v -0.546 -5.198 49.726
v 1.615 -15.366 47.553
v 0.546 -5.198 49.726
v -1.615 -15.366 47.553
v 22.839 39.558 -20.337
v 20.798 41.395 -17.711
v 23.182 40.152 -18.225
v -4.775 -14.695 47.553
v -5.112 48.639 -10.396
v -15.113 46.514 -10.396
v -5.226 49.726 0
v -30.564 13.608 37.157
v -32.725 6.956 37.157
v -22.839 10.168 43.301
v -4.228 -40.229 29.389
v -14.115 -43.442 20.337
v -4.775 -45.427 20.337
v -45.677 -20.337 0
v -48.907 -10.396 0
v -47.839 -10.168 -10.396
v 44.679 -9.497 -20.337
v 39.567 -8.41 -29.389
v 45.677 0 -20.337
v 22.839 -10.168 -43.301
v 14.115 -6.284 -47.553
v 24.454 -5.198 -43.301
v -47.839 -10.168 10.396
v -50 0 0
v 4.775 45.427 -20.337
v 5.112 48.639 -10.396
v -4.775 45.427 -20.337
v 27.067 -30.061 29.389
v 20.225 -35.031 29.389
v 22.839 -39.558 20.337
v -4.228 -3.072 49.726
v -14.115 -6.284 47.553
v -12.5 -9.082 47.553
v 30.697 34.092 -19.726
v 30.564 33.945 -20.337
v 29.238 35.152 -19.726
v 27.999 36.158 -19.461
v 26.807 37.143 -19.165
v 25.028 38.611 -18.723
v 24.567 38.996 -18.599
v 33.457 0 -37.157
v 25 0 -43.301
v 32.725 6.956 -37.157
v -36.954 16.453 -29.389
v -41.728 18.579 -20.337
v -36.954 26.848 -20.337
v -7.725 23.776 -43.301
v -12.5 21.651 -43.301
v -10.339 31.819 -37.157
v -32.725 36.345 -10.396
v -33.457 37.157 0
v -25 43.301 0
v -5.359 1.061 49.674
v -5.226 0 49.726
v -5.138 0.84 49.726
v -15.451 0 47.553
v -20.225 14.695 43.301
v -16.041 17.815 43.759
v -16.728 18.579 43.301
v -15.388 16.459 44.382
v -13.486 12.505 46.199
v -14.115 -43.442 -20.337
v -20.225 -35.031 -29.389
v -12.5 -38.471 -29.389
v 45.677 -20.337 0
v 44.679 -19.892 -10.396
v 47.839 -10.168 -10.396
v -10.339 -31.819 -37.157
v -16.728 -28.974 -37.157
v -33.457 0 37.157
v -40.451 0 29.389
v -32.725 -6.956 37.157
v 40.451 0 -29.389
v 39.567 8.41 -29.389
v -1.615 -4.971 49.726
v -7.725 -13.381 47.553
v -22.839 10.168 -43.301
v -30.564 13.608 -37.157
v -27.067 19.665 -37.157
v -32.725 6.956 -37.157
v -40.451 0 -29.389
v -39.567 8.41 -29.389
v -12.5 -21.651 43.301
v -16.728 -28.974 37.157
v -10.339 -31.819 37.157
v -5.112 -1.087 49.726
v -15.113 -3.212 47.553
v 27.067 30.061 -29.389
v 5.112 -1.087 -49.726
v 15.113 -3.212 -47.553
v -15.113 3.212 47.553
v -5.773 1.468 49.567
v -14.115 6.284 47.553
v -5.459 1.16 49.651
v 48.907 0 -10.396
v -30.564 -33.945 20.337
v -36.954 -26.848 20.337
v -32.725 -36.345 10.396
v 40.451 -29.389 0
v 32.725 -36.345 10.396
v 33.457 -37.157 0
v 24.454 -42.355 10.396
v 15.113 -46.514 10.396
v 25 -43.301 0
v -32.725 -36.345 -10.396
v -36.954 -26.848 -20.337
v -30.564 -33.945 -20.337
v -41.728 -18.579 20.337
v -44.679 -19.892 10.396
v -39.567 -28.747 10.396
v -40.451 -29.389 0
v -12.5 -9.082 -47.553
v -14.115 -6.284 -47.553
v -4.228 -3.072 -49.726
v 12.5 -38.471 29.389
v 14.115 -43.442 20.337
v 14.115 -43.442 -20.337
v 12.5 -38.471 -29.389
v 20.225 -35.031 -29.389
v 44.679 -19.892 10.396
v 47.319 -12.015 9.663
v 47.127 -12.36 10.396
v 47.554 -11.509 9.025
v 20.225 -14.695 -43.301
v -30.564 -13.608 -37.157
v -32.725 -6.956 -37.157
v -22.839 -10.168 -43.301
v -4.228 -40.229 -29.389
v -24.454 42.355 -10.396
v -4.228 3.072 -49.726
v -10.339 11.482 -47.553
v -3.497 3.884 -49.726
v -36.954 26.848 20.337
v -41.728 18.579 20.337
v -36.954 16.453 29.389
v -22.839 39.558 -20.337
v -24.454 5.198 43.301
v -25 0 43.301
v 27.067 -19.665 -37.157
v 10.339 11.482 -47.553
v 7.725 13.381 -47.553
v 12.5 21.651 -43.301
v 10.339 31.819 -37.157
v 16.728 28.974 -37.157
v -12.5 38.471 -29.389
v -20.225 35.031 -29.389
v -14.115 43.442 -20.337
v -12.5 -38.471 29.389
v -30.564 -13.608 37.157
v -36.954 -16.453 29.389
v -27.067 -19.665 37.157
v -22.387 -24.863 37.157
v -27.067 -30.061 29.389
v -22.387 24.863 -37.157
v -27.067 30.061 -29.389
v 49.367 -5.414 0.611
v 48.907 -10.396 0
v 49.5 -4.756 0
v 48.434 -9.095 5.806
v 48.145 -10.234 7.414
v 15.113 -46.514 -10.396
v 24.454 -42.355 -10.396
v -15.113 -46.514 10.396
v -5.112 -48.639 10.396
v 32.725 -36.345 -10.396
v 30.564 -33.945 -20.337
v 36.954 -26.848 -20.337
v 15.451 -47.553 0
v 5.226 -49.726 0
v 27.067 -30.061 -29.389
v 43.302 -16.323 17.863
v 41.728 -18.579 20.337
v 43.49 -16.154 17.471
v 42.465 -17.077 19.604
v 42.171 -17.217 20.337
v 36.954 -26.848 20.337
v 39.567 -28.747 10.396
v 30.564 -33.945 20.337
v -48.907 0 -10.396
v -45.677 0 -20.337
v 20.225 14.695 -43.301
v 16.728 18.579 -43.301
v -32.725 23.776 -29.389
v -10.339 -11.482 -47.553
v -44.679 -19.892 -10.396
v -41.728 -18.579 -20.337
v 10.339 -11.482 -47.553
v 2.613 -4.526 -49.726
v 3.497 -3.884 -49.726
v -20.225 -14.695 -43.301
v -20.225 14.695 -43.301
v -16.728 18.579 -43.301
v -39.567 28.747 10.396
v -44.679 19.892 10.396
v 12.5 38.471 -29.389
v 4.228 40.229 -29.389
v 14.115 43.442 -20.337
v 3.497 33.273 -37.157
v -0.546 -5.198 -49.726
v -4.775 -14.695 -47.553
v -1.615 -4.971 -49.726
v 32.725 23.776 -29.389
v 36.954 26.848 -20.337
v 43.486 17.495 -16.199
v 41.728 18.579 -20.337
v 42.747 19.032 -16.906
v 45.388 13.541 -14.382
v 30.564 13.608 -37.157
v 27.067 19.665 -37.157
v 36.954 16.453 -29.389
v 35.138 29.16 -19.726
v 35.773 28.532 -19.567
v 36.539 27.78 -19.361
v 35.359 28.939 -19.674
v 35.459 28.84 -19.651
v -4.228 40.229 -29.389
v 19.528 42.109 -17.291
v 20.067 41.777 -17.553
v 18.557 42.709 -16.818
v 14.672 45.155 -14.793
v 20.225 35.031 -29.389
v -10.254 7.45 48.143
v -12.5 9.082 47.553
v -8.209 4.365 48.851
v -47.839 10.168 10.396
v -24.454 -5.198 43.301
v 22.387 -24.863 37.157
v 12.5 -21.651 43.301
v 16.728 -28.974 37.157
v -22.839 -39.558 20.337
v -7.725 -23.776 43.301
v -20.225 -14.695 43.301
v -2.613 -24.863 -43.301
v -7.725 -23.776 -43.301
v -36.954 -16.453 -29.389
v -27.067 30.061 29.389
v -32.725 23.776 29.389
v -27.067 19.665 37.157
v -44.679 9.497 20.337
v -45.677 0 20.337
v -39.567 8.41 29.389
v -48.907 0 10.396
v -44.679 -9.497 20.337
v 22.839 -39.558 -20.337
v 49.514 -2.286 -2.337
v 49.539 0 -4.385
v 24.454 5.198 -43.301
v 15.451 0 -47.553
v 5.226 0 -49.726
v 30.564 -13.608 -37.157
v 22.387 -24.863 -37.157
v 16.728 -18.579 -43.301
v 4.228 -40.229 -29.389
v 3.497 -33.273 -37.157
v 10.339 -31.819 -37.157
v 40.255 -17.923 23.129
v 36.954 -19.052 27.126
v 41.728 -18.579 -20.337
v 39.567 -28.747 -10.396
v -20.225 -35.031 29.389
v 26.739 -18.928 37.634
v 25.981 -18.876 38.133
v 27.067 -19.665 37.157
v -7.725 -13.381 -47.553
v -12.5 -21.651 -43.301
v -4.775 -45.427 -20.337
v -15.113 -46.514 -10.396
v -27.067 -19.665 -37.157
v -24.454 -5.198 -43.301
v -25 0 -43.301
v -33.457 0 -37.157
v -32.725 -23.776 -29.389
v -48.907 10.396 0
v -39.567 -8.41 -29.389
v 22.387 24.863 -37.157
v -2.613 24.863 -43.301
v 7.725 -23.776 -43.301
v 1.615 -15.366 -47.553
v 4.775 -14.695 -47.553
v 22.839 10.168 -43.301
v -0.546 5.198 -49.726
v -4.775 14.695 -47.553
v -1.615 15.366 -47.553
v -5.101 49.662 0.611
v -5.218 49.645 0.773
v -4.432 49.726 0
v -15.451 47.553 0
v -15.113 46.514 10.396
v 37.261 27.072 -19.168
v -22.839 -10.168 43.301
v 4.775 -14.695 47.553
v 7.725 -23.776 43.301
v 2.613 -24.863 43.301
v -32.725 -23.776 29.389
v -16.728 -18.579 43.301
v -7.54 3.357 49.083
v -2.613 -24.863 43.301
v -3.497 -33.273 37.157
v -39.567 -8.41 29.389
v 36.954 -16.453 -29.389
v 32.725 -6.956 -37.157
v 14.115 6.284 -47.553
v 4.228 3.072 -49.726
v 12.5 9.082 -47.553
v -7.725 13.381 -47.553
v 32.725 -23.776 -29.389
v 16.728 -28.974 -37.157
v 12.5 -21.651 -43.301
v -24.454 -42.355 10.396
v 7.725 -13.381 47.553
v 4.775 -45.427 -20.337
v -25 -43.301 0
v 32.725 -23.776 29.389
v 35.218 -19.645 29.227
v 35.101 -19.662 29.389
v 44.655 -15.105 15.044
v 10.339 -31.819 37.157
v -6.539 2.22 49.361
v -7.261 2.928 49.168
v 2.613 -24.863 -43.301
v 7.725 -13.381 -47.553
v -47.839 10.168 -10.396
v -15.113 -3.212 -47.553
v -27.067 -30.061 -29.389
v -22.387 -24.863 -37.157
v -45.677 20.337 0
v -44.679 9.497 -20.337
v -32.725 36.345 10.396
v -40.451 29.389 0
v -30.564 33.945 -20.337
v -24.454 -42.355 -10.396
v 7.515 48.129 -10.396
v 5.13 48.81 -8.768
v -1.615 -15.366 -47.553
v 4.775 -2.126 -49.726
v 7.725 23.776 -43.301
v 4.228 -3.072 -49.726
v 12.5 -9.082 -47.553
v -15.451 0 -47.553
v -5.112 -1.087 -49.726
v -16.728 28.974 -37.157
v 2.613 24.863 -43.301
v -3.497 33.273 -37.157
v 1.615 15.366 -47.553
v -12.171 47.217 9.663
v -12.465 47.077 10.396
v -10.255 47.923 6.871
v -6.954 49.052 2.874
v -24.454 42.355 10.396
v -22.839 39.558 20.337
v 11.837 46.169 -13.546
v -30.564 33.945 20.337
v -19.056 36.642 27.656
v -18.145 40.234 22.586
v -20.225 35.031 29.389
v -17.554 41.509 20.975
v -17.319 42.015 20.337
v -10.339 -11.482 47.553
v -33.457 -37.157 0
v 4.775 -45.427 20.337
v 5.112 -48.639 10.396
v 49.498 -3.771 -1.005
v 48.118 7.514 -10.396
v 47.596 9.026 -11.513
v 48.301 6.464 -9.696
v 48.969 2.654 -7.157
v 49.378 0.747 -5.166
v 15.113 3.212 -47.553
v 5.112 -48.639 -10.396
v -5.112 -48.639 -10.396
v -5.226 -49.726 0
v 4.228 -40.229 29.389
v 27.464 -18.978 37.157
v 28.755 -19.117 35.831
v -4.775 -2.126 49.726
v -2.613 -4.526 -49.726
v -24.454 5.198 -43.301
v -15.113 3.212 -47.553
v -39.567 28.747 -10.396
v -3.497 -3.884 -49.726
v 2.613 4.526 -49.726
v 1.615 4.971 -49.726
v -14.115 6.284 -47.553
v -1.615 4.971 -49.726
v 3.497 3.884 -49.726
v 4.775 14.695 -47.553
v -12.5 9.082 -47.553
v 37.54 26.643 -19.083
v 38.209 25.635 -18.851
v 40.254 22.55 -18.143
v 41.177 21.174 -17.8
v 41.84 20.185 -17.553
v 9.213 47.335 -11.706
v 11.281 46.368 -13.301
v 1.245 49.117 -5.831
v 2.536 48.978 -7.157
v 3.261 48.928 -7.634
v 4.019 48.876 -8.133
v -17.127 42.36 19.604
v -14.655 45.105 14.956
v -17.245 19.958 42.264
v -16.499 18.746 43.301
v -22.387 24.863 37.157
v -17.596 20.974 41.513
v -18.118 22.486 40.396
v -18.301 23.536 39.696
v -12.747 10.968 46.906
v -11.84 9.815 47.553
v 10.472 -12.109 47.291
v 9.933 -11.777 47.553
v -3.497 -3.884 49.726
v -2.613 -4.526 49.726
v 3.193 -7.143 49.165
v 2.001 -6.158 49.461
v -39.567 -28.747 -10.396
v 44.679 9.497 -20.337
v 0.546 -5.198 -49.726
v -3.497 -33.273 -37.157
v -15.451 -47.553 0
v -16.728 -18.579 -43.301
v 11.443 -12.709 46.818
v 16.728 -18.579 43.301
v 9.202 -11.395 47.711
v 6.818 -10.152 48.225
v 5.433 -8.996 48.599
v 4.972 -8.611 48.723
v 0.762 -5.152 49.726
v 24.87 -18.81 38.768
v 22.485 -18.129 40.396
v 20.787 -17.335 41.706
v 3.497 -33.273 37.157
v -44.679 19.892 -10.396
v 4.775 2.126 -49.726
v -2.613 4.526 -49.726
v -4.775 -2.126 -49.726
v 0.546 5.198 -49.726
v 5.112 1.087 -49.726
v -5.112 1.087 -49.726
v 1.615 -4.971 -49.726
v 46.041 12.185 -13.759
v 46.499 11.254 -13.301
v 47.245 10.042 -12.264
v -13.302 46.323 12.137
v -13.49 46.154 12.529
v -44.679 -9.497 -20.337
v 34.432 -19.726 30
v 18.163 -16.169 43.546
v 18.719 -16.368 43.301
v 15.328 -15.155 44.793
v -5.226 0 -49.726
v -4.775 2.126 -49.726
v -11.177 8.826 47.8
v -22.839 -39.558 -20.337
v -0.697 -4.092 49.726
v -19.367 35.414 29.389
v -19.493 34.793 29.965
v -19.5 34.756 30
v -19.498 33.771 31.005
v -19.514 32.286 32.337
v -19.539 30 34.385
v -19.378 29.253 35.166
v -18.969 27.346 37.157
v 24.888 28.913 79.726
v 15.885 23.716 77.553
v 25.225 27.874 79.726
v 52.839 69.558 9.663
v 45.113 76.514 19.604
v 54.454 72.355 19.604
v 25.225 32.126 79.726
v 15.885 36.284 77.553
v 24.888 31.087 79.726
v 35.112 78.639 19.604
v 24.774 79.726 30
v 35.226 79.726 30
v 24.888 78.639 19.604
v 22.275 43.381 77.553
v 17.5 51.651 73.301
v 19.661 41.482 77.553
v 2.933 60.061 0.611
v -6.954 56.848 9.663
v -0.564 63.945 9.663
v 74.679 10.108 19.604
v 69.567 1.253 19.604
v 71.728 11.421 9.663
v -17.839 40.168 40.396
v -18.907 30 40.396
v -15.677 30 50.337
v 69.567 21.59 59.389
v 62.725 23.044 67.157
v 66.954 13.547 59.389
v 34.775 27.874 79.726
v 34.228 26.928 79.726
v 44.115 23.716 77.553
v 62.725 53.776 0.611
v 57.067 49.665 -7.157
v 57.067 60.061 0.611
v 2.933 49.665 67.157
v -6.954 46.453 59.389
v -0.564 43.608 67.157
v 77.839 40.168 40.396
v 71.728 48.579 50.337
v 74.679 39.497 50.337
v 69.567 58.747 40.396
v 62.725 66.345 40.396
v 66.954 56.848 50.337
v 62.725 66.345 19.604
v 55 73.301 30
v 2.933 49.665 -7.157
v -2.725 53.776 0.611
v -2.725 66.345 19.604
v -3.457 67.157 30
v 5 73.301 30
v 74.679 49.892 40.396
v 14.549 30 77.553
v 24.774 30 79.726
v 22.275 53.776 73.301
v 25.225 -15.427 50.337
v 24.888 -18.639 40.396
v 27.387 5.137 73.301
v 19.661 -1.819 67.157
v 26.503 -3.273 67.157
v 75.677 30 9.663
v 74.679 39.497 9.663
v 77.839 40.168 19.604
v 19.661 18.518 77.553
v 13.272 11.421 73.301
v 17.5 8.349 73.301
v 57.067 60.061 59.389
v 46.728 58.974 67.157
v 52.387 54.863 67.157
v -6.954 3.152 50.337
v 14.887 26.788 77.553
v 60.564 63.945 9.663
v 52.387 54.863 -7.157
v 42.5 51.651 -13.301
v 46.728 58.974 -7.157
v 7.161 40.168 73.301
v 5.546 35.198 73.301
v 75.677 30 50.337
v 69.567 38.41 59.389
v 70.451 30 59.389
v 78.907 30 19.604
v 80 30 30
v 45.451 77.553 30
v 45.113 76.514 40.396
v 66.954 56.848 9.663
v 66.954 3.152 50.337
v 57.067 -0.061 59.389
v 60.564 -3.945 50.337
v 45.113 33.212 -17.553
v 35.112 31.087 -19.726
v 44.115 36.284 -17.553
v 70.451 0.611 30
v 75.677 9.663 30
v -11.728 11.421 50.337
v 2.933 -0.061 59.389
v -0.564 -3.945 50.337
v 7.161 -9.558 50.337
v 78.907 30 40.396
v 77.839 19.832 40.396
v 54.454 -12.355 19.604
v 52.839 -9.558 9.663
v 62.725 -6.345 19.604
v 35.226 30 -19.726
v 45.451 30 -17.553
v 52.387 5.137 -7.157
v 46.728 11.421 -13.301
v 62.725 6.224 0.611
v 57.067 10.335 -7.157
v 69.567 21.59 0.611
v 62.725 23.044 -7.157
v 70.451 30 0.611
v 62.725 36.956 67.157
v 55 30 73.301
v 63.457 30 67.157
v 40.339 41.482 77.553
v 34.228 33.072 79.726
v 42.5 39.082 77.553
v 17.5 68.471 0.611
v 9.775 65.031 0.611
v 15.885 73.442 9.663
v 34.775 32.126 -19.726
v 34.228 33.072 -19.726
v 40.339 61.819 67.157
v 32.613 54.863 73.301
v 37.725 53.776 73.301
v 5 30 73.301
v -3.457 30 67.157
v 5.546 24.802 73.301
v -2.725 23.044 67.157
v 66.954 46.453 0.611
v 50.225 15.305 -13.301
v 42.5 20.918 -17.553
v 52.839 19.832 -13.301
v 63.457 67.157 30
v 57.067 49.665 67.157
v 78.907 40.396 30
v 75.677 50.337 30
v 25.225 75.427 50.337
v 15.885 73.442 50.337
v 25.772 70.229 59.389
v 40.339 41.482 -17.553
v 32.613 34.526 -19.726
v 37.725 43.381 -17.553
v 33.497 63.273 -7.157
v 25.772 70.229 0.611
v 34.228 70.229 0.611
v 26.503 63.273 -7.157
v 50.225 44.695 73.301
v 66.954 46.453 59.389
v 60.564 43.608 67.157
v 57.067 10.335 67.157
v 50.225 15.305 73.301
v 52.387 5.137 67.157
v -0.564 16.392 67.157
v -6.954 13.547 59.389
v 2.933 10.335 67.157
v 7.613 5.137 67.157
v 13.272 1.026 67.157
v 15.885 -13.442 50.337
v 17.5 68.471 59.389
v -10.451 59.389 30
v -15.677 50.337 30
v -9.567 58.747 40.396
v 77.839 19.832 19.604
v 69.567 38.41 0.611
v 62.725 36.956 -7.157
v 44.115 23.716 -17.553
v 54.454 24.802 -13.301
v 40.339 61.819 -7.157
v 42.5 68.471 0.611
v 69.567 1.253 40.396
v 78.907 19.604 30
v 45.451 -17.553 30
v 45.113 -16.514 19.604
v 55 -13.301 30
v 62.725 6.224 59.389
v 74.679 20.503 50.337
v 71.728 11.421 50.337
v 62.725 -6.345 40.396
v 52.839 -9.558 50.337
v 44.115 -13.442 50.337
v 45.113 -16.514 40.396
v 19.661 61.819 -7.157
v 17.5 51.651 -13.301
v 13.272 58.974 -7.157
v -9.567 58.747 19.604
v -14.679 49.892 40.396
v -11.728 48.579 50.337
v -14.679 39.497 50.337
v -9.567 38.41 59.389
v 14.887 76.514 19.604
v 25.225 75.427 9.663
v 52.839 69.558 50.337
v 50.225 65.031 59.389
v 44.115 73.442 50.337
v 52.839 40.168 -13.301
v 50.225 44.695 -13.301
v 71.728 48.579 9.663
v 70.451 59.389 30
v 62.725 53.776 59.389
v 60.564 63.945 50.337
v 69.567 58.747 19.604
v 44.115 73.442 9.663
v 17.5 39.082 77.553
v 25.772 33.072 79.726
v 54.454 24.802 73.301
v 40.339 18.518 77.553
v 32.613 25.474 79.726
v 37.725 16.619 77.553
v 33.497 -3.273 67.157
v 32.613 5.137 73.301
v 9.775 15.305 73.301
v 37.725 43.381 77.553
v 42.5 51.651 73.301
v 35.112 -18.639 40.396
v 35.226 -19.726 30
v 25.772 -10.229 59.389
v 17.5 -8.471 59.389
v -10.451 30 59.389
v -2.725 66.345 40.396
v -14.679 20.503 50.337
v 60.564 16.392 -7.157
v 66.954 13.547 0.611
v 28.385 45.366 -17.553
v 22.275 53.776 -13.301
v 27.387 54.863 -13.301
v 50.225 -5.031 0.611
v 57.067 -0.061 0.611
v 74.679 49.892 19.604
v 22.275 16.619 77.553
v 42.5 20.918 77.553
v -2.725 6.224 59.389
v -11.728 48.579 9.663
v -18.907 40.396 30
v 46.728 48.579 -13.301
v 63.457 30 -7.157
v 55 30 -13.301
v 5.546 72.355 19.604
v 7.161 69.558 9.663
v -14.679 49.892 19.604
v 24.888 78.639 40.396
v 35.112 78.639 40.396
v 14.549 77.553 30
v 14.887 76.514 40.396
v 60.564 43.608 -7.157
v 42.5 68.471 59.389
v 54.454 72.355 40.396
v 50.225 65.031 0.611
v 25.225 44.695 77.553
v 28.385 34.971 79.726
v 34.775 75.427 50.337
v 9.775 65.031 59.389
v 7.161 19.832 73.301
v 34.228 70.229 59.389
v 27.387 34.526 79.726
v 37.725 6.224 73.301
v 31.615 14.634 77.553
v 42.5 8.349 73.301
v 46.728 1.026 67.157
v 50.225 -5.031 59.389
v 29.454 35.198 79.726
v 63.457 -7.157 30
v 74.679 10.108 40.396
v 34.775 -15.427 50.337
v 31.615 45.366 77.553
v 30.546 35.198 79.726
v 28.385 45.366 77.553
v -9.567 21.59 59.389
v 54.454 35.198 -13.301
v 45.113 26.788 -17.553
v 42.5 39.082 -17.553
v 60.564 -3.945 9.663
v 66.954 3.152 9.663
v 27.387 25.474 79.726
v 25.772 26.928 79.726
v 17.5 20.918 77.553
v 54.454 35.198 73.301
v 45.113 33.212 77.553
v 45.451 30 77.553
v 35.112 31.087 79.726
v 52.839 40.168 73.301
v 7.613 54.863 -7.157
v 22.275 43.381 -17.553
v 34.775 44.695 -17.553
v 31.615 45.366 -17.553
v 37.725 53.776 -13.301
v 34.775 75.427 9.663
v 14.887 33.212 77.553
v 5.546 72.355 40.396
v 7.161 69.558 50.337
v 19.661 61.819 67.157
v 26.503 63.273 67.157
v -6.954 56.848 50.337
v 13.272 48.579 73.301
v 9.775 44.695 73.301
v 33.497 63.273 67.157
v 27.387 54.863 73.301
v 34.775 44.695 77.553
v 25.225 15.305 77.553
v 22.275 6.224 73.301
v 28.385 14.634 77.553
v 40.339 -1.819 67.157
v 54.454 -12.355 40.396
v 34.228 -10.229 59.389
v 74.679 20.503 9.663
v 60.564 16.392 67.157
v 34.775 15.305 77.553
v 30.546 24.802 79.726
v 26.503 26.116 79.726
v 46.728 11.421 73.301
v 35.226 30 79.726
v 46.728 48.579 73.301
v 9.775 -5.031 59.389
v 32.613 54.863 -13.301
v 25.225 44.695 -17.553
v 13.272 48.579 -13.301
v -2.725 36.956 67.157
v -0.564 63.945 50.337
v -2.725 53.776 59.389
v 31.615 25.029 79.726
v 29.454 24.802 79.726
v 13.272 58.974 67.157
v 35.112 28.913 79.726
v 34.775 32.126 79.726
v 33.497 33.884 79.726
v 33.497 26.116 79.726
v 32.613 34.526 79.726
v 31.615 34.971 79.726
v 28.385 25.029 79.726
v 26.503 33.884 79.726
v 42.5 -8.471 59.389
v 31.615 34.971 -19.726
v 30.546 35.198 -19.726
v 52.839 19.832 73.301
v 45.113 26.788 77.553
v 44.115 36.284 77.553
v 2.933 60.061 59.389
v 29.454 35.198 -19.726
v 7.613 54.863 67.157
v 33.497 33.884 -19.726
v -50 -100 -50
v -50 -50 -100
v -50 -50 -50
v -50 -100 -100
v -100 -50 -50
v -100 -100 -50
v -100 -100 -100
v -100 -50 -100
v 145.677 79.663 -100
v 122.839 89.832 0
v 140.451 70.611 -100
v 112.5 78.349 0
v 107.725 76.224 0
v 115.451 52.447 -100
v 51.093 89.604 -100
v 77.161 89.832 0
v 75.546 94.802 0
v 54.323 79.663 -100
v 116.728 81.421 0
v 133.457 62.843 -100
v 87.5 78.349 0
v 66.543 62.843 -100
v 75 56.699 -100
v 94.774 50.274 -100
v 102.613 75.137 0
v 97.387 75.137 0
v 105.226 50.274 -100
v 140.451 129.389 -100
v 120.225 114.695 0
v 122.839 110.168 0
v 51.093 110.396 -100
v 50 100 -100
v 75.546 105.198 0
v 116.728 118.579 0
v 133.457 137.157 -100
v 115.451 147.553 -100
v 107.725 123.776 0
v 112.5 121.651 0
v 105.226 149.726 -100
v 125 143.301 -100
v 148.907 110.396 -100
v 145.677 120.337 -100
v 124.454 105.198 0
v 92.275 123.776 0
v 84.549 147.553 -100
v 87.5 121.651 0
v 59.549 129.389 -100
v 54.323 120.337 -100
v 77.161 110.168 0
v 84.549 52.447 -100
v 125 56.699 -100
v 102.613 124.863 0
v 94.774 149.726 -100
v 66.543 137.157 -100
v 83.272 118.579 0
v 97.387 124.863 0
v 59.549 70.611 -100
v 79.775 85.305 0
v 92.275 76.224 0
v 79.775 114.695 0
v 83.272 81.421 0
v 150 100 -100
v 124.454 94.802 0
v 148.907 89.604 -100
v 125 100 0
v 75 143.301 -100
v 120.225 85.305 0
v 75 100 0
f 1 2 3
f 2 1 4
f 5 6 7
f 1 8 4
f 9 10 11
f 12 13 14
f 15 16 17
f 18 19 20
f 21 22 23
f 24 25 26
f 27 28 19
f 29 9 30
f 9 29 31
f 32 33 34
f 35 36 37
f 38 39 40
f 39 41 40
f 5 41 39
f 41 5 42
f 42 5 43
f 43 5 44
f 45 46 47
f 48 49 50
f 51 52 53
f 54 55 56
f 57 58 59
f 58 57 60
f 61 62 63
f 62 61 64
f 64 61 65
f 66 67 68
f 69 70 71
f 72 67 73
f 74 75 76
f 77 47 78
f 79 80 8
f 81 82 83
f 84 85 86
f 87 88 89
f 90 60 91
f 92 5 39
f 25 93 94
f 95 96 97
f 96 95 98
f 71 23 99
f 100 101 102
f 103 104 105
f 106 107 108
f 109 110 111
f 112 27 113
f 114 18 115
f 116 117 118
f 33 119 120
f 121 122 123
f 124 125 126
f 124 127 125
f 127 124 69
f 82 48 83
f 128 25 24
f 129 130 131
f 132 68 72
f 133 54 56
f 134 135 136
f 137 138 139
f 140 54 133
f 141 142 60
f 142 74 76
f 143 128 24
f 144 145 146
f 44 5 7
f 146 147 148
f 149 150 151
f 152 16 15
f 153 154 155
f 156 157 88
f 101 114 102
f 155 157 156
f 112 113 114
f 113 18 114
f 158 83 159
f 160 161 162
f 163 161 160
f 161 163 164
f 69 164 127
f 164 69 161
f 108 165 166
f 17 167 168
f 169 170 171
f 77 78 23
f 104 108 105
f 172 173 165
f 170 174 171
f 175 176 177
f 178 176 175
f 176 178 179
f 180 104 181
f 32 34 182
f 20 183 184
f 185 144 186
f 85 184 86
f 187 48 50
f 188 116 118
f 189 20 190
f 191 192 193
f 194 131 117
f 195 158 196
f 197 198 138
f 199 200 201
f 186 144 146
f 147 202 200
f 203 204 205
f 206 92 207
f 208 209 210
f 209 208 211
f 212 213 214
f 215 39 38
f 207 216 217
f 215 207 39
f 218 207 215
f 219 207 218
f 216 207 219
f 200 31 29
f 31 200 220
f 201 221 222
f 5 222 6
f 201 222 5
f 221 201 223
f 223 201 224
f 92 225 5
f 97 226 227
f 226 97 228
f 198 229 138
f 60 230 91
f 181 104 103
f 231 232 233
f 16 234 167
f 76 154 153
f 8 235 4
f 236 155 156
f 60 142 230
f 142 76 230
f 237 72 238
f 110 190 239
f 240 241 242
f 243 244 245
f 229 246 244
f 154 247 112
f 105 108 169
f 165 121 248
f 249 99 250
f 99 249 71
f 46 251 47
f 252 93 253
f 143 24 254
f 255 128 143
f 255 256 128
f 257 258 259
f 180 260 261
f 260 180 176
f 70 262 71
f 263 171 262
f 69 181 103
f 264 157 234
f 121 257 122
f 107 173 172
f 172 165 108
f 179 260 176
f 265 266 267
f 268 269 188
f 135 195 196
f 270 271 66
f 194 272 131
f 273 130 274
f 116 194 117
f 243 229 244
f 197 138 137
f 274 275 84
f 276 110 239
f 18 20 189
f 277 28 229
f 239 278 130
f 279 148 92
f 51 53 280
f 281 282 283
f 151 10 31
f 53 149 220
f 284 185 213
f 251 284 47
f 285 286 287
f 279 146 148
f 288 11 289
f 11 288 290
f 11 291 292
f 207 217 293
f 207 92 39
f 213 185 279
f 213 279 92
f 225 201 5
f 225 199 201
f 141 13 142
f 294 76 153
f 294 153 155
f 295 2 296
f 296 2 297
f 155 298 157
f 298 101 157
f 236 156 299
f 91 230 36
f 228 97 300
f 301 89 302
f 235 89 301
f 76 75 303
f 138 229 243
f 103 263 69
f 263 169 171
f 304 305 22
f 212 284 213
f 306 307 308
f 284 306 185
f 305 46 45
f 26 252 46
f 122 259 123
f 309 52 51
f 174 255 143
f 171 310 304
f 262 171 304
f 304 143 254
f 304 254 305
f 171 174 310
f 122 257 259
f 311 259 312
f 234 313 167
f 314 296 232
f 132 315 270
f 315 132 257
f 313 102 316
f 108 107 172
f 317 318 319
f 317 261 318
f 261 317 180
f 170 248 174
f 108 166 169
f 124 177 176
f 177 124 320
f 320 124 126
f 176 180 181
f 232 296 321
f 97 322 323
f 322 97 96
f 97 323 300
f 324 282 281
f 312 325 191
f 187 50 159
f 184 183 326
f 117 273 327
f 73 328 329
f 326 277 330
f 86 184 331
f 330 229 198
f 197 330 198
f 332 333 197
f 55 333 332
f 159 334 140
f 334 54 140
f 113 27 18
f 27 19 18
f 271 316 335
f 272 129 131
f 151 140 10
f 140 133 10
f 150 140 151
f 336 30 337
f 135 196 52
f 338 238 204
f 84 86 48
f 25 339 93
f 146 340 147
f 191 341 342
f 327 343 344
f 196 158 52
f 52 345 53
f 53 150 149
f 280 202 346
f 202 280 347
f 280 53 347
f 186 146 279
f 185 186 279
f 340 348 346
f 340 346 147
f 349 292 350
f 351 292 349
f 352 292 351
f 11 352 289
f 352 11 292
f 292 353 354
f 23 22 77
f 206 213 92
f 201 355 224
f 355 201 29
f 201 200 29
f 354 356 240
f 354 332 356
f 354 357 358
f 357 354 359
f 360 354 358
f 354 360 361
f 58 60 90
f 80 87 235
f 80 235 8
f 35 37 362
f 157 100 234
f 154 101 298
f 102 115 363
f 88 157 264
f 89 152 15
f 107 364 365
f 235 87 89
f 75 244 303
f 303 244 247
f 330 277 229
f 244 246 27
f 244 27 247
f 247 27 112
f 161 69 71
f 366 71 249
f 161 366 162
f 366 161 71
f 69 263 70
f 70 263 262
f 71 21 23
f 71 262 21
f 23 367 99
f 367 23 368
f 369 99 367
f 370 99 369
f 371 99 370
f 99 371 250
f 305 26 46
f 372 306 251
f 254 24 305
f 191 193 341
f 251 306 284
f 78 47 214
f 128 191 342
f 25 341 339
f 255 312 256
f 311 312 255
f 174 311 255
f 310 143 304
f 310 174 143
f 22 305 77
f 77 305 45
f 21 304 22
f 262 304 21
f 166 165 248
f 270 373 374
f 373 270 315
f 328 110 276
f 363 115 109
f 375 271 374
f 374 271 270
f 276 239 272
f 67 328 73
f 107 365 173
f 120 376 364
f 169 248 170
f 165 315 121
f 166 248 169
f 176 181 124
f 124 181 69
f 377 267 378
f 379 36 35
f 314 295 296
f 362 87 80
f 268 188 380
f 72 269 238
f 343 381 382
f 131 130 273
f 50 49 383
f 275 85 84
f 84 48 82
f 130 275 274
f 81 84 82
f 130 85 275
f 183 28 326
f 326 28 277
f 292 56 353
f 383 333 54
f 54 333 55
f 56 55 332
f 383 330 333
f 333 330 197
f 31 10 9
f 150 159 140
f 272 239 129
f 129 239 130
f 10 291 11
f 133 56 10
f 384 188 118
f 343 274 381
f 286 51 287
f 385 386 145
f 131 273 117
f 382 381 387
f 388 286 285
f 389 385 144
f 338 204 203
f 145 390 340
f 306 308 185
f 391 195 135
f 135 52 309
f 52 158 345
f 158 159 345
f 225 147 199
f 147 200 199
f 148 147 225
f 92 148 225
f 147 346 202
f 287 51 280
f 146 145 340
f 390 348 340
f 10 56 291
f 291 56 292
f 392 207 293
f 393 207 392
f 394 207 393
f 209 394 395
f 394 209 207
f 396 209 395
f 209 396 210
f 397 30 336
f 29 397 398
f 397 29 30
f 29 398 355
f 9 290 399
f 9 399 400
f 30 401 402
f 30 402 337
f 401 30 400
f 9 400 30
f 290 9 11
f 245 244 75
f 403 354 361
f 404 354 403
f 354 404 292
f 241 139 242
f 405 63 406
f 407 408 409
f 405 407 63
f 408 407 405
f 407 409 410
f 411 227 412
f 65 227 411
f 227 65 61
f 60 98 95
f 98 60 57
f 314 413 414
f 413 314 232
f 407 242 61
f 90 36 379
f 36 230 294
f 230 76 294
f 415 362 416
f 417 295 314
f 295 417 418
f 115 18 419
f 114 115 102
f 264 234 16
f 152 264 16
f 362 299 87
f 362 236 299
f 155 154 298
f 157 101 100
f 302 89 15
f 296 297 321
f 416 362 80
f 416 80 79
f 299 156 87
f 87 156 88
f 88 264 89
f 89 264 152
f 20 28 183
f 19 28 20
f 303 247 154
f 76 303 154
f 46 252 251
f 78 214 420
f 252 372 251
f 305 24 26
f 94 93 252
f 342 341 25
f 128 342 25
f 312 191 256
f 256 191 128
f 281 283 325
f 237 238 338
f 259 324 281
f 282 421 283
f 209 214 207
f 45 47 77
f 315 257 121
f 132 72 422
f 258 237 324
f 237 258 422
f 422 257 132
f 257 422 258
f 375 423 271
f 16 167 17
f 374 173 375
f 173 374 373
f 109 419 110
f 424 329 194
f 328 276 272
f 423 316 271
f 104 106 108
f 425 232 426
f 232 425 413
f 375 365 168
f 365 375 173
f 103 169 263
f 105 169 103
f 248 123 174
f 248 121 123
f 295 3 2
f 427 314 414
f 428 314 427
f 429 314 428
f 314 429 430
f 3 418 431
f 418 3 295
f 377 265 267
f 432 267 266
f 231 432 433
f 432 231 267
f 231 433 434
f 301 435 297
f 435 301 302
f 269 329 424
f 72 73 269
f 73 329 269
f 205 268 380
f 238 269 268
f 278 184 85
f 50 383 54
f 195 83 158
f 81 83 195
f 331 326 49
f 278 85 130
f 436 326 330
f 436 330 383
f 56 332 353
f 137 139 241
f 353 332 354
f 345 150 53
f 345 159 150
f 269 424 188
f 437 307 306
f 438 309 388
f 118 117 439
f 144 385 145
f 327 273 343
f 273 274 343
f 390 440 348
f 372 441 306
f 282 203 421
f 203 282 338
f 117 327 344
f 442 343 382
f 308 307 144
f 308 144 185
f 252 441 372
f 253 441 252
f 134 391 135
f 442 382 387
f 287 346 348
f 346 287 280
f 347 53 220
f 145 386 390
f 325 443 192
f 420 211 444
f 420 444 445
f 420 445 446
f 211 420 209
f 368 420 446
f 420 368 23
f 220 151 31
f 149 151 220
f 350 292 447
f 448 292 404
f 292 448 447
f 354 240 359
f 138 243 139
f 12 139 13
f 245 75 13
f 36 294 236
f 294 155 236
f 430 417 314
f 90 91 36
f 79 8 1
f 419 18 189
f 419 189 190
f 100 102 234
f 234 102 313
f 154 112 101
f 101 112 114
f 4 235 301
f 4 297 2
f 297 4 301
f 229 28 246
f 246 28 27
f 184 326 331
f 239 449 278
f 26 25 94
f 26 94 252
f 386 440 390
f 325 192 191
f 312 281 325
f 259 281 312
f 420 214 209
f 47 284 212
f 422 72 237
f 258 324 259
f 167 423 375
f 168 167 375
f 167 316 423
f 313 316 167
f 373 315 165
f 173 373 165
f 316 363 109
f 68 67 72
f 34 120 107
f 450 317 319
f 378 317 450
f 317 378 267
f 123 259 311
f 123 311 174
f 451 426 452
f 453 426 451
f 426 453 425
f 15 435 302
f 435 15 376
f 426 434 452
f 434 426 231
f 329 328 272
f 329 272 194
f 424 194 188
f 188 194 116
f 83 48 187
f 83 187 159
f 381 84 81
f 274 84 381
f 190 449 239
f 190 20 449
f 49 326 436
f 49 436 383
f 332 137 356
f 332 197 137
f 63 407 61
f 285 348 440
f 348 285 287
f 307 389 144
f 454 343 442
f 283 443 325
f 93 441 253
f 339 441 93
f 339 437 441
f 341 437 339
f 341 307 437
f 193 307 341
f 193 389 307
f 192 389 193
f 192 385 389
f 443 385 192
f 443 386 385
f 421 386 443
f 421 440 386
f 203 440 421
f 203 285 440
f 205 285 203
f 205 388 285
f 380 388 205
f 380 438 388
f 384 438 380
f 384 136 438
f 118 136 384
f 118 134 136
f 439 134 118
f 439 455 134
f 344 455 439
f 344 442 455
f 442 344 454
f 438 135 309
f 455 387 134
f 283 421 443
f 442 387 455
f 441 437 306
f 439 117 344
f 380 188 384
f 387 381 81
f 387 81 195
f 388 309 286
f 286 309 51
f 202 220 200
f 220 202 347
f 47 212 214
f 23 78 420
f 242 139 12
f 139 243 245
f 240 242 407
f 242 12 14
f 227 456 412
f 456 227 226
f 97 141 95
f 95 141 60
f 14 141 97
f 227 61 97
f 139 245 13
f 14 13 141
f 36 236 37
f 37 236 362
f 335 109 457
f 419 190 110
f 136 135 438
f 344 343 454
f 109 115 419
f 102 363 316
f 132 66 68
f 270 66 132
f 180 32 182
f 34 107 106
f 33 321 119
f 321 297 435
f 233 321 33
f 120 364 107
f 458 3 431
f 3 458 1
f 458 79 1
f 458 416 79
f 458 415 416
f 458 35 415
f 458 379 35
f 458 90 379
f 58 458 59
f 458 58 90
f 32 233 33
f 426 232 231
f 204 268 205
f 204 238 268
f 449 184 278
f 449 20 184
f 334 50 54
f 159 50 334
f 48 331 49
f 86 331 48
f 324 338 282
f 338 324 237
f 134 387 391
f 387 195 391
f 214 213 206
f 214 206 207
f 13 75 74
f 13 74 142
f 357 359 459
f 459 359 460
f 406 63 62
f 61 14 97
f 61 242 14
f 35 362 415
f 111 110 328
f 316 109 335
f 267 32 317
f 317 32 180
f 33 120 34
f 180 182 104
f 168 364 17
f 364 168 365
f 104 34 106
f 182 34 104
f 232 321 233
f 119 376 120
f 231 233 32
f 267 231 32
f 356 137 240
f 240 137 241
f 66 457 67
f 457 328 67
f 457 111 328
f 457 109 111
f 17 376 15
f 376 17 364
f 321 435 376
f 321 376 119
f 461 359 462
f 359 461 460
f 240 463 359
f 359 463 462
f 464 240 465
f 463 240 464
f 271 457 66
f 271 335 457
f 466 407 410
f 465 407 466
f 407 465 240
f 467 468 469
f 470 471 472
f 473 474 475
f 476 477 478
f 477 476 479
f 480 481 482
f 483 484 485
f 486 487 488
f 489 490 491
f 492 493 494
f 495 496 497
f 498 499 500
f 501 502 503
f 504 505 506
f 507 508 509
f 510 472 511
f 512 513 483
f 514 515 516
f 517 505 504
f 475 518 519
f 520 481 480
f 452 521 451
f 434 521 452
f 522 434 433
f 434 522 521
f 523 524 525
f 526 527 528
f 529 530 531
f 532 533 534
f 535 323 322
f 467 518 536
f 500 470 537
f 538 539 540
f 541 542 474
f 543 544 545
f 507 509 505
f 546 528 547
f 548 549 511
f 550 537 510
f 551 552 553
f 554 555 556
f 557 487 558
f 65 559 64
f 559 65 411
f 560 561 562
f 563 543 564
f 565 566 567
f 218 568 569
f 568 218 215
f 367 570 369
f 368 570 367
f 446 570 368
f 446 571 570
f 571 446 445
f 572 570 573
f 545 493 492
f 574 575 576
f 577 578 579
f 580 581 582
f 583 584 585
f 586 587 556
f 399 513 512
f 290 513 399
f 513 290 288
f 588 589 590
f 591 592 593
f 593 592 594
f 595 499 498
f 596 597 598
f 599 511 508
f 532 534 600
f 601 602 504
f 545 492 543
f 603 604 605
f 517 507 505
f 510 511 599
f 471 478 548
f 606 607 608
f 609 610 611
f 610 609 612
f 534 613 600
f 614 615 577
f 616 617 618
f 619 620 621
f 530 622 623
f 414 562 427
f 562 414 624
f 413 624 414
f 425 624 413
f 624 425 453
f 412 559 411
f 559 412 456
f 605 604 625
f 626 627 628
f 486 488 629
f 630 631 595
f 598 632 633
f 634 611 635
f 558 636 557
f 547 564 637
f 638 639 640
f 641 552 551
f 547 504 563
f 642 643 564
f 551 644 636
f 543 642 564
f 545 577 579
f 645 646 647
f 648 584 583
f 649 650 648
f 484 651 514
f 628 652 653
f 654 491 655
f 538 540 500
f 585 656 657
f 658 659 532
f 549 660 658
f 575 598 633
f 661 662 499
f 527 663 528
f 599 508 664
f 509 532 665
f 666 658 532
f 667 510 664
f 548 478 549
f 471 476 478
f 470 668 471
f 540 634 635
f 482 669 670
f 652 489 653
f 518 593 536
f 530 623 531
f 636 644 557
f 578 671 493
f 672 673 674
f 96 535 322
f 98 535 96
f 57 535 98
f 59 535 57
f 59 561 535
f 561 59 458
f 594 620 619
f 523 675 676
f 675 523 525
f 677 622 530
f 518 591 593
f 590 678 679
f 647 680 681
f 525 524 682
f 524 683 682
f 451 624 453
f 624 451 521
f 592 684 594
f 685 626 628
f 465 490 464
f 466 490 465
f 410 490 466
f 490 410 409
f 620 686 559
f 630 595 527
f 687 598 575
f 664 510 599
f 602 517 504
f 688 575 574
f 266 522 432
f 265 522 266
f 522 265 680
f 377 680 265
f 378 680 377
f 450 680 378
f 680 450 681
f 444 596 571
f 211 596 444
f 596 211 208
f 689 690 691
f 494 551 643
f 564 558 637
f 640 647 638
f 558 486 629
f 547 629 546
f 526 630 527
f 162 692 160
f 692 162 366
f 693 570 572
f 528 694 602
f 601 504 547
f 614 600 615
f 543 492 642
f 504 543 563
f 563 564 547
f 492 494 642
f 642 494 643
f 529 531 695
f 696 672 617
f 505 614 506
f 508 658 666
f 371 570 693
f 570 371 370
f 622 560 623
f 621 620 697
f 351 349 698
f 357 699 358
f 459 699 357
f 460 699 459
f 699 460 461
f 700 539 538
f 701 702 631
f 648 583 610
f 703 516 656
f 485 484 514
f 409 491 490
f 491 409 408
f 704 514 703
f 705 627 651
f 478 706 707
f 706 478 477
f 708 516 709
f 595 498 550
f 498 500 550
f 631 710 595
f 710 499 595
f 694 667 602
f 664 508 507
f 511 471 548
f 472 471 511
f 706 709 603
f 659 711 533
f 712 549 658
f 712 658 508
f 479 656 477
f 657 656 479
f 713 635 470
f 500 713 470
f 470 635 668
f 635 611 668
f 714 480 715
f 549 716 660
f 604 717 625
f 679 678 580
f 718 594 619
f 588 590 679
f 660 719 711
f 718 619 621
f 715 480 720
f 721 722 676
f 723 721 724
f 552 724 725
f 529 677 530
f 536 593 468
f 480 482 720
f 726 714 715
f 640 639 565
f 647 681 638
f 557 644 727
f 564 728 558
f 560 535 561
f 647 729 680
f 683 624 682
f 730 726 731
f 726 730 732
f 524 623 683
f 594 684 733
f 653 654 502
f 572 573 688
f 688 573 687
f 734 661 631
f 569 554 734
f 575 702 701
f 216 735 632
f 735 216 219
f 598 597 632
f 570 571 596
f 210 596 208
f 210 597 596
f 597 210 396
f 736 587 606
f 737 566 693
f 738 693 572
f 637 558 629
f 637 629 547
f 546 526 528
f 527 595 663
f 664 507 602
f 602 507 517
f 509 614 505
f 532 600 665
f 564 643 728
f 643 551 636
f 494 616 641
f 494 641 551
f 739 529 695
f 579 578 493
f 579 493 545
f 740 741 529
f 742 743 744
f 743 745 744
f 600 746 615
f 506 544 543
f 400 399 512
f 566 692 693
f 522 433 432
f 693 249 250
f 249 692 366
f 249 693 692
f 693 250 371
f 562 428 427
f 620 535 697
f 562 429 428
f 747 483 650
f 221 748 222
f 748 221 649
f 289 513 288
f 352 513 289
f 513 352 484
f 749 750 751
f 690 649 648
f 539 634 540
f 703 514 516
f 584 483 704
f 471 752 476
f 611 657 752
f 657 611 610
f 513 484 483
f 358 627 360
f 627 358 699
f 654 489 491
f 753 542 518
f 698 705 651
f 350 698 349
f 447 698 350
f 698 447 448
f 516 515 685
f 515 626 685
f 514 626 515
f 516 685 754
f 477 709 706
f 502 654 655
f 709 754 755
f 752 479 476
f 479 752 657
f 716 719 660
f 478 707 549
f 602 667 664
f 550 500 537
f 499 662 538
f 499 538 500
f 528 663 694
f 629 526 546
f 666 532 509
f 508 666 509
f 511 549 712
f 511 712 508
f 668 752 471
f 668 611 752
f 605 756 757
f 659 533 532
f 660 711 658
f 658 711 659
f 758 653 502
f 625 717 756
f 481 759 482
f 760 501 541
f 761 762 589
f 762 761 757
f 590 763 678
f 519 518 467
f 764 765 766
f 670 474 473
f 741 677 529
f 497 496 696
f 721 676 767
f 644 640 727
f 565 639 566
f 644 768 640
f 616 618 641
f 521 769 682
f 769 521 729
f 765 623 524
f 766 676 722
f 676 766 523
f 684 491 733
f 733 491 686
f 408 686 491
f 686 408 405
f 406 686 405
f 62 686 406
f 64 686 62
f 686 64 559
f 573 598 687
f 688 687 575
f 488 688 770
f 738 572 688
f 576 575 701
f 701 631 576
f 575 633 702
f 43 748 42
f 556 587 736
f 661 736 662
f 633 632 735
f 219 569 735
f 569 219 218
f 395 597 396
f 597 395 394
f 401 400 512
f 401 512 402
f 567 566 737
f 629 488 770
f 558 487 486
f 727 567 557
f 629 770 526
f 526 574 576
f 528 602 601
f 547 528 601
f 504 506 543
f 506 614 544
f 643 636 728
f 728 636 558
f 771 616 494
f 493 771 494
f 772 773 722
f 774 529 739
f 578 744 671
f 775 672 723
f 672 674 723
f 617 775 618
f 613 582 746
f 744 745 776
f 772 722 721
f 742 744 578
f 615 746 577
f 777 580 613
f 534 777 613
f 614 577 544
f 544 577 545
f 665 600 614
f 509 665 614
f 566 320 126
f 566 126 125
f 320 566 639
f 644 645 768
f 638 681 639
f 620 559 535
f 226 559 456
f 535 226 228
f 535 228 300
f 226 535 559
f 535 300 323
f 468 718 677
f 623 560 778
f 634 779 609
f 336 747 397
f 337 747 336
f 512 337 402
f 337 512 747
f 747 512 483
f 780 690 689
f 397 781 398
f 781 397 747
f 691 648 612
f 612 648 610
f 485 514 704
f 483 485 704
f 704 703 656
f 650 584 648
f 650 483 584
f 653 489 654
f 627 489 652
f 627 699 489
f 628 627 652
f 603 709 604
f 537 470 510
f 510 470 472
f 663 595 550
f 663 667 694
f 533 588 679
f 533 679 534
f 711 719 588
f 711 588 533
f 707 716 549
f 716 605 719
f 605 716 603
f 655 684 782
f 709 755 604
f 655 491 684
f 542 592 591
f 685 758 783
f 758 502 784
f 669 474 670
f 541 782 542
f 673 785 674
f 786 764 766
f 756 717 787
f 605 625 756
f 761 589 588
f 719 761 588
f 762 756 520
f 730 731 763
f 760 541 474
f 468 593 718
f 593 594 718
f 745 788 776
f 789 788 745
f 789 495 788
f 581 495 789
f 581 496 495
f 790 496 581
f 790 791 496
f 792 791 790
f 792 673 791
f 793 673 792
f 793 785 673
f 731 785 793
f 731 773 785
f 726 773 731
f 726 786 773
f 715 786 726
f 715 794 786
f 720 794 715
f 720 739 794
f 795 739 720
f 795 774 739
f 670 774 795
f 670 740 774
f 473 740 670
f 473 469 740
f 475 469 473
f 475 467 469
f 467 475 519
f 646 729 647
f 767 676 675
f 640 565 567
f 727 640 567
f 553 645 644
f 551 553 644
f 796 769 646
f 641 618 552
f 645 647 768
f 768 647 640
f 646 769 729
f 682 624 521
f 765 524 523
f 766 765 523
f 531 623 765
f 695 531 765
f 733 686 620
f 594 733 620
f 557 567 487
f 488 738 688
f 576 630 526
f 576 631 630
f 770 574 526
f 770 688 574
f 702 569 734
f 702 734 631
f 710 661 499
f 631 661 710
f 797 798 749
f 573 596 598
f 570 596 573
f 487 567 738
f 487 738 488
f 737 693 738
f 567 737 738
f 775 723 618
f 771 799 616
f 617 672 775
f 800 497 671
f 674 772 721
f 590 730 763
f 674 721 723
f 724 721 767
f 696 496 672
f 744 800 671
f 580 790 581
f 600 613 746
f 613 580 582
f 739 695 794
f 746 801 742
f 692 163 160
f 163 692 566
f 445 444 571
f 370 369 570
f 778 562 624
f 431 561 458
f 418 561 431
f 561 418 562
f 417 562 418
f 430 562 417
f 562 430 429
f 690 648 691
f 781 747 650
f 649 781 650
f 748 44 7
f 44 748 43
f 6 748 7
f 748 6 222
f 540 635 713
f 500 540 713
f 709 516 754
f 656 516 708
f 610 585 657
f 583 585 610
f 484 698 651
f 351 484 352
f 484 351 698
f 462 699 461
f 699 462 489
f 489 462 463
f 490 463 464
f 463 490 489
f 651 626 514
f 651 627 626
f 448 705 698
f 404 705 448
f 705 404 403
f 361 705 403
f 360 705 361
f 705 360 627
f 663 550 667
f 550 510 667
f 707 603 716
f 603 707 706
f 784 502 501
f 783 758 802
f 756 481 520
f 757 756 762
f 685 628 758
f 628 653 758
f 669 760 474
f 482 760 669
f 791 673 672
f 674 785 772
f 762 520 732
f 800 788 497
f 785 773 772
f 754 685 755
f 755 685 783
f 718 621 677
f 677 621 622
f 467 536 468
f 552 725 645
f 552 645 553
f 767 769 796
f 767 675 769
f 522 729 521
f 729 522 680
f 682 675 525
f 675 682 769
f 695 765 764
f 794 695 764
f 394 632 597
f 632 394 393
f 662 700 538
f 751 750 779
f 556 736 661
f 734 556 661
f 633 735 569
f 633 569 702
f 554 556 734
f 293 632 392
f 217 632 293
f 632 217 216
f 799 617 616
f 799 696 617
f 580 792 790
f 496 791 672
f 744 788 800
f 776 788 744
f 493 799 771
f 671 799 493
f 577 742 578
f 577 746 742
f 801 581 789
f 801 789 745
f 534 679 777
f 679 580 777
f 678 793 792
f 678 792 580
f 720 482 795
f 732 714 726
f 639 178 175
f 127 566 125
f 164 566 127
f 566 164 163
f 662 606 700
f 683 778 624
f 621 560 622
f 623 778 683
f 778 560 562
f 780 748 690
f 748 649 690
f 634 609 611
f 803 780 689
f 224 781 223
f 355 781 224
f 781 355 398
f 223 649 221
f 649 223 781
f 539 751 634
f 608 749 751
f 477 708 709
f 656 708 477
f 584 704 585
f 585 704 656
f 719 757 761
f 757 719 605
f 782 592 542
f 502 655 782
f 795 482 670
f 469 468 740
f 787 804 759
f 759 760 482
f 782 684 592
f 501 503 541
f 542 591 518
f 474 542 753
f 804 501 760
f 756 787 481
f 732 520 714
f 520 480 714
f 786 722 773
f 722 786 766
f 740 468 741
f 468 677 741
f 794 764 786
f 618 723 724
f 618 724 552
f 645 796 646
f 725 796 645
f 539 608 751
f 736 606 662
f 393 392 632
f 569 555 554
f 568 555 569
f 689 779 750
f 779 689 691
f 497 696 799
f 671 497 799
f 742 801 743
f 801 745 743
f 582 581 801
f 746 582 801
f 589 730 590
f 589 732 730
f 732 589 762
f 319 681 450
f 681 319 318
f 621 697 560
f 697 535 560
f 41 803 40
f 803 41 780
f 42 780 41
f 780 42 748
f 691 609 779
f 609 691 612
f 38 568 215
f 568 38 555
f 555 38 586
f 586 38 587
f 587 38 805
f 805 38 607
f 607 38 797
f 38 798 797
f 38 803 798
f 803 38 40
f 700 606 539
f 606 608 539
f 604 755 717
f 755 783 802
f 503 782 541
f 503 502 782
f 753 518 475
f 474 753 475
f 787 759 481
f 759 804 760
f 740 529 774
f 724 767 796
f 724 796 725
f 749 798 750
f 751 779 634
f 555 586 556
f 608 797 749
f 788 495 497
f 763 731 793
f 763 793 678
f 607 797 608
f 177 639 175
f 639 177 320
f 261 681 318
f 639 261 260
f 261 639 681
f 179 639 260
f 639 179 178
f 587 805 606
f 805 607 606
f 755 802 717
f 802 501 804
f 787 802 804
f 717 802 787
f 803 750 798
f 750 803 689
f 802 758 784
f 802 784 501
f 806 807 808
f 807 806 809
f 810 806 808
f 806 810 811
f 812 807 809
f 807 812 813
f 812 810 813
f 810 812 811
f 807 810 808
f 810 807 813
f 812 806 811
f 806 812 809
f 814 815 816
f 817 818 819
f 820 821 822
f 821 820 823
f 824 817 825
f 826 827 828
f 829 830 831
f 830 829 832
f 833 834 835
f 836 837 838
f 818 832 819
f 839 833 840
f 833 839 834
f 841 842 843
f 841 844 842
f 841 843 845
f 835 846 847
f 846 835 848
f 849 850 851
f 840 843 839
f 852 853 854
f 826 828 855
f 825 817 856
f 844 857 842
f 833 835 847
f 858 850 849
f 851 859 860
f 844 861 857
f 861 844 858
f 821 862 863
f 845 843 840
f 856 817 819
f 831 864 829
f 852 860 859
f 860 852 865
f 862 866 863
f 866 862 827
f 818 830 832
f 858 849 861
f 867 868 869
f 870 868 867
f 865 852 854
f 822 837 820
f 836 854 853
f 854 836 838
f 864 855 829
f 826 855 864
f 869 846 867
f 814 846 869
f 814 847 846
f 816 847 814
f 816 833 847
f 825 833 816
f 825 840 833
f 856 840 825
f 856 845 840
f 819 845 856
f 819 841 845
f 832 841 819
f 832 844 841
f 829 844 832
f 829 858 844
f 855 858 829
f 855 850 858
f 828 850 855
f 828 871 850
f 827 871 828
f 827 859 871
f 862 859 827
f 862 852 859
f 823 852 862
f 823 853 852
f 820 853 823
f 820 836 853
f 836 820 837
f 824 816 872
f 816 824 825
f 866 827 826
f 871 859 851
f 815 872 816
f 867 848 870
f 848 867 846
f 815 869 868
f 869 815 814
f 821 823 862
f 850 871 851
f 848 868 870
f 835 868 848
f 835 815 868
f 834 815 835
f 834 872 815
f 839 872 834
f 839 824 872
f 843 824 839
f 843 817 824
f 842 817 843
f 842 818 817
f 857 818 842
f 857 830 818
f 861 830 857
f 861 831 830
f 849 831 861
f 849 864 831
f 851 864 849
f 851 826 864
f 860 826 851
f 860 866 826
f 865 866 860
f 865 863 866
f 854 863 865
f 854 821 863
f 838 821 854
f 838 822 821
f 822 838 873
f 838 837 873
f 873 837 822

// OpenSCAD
//This is an example of the basic shapes and how to move them around

sphere(50);

move = 30;

translate([move,move,move]){
	sphere(50);
}

translate([-100,-100,-100]){
	cube([50,50,50]);
}

translate([100,100,-100]){
	cylinder(100,50,25,false);
}
